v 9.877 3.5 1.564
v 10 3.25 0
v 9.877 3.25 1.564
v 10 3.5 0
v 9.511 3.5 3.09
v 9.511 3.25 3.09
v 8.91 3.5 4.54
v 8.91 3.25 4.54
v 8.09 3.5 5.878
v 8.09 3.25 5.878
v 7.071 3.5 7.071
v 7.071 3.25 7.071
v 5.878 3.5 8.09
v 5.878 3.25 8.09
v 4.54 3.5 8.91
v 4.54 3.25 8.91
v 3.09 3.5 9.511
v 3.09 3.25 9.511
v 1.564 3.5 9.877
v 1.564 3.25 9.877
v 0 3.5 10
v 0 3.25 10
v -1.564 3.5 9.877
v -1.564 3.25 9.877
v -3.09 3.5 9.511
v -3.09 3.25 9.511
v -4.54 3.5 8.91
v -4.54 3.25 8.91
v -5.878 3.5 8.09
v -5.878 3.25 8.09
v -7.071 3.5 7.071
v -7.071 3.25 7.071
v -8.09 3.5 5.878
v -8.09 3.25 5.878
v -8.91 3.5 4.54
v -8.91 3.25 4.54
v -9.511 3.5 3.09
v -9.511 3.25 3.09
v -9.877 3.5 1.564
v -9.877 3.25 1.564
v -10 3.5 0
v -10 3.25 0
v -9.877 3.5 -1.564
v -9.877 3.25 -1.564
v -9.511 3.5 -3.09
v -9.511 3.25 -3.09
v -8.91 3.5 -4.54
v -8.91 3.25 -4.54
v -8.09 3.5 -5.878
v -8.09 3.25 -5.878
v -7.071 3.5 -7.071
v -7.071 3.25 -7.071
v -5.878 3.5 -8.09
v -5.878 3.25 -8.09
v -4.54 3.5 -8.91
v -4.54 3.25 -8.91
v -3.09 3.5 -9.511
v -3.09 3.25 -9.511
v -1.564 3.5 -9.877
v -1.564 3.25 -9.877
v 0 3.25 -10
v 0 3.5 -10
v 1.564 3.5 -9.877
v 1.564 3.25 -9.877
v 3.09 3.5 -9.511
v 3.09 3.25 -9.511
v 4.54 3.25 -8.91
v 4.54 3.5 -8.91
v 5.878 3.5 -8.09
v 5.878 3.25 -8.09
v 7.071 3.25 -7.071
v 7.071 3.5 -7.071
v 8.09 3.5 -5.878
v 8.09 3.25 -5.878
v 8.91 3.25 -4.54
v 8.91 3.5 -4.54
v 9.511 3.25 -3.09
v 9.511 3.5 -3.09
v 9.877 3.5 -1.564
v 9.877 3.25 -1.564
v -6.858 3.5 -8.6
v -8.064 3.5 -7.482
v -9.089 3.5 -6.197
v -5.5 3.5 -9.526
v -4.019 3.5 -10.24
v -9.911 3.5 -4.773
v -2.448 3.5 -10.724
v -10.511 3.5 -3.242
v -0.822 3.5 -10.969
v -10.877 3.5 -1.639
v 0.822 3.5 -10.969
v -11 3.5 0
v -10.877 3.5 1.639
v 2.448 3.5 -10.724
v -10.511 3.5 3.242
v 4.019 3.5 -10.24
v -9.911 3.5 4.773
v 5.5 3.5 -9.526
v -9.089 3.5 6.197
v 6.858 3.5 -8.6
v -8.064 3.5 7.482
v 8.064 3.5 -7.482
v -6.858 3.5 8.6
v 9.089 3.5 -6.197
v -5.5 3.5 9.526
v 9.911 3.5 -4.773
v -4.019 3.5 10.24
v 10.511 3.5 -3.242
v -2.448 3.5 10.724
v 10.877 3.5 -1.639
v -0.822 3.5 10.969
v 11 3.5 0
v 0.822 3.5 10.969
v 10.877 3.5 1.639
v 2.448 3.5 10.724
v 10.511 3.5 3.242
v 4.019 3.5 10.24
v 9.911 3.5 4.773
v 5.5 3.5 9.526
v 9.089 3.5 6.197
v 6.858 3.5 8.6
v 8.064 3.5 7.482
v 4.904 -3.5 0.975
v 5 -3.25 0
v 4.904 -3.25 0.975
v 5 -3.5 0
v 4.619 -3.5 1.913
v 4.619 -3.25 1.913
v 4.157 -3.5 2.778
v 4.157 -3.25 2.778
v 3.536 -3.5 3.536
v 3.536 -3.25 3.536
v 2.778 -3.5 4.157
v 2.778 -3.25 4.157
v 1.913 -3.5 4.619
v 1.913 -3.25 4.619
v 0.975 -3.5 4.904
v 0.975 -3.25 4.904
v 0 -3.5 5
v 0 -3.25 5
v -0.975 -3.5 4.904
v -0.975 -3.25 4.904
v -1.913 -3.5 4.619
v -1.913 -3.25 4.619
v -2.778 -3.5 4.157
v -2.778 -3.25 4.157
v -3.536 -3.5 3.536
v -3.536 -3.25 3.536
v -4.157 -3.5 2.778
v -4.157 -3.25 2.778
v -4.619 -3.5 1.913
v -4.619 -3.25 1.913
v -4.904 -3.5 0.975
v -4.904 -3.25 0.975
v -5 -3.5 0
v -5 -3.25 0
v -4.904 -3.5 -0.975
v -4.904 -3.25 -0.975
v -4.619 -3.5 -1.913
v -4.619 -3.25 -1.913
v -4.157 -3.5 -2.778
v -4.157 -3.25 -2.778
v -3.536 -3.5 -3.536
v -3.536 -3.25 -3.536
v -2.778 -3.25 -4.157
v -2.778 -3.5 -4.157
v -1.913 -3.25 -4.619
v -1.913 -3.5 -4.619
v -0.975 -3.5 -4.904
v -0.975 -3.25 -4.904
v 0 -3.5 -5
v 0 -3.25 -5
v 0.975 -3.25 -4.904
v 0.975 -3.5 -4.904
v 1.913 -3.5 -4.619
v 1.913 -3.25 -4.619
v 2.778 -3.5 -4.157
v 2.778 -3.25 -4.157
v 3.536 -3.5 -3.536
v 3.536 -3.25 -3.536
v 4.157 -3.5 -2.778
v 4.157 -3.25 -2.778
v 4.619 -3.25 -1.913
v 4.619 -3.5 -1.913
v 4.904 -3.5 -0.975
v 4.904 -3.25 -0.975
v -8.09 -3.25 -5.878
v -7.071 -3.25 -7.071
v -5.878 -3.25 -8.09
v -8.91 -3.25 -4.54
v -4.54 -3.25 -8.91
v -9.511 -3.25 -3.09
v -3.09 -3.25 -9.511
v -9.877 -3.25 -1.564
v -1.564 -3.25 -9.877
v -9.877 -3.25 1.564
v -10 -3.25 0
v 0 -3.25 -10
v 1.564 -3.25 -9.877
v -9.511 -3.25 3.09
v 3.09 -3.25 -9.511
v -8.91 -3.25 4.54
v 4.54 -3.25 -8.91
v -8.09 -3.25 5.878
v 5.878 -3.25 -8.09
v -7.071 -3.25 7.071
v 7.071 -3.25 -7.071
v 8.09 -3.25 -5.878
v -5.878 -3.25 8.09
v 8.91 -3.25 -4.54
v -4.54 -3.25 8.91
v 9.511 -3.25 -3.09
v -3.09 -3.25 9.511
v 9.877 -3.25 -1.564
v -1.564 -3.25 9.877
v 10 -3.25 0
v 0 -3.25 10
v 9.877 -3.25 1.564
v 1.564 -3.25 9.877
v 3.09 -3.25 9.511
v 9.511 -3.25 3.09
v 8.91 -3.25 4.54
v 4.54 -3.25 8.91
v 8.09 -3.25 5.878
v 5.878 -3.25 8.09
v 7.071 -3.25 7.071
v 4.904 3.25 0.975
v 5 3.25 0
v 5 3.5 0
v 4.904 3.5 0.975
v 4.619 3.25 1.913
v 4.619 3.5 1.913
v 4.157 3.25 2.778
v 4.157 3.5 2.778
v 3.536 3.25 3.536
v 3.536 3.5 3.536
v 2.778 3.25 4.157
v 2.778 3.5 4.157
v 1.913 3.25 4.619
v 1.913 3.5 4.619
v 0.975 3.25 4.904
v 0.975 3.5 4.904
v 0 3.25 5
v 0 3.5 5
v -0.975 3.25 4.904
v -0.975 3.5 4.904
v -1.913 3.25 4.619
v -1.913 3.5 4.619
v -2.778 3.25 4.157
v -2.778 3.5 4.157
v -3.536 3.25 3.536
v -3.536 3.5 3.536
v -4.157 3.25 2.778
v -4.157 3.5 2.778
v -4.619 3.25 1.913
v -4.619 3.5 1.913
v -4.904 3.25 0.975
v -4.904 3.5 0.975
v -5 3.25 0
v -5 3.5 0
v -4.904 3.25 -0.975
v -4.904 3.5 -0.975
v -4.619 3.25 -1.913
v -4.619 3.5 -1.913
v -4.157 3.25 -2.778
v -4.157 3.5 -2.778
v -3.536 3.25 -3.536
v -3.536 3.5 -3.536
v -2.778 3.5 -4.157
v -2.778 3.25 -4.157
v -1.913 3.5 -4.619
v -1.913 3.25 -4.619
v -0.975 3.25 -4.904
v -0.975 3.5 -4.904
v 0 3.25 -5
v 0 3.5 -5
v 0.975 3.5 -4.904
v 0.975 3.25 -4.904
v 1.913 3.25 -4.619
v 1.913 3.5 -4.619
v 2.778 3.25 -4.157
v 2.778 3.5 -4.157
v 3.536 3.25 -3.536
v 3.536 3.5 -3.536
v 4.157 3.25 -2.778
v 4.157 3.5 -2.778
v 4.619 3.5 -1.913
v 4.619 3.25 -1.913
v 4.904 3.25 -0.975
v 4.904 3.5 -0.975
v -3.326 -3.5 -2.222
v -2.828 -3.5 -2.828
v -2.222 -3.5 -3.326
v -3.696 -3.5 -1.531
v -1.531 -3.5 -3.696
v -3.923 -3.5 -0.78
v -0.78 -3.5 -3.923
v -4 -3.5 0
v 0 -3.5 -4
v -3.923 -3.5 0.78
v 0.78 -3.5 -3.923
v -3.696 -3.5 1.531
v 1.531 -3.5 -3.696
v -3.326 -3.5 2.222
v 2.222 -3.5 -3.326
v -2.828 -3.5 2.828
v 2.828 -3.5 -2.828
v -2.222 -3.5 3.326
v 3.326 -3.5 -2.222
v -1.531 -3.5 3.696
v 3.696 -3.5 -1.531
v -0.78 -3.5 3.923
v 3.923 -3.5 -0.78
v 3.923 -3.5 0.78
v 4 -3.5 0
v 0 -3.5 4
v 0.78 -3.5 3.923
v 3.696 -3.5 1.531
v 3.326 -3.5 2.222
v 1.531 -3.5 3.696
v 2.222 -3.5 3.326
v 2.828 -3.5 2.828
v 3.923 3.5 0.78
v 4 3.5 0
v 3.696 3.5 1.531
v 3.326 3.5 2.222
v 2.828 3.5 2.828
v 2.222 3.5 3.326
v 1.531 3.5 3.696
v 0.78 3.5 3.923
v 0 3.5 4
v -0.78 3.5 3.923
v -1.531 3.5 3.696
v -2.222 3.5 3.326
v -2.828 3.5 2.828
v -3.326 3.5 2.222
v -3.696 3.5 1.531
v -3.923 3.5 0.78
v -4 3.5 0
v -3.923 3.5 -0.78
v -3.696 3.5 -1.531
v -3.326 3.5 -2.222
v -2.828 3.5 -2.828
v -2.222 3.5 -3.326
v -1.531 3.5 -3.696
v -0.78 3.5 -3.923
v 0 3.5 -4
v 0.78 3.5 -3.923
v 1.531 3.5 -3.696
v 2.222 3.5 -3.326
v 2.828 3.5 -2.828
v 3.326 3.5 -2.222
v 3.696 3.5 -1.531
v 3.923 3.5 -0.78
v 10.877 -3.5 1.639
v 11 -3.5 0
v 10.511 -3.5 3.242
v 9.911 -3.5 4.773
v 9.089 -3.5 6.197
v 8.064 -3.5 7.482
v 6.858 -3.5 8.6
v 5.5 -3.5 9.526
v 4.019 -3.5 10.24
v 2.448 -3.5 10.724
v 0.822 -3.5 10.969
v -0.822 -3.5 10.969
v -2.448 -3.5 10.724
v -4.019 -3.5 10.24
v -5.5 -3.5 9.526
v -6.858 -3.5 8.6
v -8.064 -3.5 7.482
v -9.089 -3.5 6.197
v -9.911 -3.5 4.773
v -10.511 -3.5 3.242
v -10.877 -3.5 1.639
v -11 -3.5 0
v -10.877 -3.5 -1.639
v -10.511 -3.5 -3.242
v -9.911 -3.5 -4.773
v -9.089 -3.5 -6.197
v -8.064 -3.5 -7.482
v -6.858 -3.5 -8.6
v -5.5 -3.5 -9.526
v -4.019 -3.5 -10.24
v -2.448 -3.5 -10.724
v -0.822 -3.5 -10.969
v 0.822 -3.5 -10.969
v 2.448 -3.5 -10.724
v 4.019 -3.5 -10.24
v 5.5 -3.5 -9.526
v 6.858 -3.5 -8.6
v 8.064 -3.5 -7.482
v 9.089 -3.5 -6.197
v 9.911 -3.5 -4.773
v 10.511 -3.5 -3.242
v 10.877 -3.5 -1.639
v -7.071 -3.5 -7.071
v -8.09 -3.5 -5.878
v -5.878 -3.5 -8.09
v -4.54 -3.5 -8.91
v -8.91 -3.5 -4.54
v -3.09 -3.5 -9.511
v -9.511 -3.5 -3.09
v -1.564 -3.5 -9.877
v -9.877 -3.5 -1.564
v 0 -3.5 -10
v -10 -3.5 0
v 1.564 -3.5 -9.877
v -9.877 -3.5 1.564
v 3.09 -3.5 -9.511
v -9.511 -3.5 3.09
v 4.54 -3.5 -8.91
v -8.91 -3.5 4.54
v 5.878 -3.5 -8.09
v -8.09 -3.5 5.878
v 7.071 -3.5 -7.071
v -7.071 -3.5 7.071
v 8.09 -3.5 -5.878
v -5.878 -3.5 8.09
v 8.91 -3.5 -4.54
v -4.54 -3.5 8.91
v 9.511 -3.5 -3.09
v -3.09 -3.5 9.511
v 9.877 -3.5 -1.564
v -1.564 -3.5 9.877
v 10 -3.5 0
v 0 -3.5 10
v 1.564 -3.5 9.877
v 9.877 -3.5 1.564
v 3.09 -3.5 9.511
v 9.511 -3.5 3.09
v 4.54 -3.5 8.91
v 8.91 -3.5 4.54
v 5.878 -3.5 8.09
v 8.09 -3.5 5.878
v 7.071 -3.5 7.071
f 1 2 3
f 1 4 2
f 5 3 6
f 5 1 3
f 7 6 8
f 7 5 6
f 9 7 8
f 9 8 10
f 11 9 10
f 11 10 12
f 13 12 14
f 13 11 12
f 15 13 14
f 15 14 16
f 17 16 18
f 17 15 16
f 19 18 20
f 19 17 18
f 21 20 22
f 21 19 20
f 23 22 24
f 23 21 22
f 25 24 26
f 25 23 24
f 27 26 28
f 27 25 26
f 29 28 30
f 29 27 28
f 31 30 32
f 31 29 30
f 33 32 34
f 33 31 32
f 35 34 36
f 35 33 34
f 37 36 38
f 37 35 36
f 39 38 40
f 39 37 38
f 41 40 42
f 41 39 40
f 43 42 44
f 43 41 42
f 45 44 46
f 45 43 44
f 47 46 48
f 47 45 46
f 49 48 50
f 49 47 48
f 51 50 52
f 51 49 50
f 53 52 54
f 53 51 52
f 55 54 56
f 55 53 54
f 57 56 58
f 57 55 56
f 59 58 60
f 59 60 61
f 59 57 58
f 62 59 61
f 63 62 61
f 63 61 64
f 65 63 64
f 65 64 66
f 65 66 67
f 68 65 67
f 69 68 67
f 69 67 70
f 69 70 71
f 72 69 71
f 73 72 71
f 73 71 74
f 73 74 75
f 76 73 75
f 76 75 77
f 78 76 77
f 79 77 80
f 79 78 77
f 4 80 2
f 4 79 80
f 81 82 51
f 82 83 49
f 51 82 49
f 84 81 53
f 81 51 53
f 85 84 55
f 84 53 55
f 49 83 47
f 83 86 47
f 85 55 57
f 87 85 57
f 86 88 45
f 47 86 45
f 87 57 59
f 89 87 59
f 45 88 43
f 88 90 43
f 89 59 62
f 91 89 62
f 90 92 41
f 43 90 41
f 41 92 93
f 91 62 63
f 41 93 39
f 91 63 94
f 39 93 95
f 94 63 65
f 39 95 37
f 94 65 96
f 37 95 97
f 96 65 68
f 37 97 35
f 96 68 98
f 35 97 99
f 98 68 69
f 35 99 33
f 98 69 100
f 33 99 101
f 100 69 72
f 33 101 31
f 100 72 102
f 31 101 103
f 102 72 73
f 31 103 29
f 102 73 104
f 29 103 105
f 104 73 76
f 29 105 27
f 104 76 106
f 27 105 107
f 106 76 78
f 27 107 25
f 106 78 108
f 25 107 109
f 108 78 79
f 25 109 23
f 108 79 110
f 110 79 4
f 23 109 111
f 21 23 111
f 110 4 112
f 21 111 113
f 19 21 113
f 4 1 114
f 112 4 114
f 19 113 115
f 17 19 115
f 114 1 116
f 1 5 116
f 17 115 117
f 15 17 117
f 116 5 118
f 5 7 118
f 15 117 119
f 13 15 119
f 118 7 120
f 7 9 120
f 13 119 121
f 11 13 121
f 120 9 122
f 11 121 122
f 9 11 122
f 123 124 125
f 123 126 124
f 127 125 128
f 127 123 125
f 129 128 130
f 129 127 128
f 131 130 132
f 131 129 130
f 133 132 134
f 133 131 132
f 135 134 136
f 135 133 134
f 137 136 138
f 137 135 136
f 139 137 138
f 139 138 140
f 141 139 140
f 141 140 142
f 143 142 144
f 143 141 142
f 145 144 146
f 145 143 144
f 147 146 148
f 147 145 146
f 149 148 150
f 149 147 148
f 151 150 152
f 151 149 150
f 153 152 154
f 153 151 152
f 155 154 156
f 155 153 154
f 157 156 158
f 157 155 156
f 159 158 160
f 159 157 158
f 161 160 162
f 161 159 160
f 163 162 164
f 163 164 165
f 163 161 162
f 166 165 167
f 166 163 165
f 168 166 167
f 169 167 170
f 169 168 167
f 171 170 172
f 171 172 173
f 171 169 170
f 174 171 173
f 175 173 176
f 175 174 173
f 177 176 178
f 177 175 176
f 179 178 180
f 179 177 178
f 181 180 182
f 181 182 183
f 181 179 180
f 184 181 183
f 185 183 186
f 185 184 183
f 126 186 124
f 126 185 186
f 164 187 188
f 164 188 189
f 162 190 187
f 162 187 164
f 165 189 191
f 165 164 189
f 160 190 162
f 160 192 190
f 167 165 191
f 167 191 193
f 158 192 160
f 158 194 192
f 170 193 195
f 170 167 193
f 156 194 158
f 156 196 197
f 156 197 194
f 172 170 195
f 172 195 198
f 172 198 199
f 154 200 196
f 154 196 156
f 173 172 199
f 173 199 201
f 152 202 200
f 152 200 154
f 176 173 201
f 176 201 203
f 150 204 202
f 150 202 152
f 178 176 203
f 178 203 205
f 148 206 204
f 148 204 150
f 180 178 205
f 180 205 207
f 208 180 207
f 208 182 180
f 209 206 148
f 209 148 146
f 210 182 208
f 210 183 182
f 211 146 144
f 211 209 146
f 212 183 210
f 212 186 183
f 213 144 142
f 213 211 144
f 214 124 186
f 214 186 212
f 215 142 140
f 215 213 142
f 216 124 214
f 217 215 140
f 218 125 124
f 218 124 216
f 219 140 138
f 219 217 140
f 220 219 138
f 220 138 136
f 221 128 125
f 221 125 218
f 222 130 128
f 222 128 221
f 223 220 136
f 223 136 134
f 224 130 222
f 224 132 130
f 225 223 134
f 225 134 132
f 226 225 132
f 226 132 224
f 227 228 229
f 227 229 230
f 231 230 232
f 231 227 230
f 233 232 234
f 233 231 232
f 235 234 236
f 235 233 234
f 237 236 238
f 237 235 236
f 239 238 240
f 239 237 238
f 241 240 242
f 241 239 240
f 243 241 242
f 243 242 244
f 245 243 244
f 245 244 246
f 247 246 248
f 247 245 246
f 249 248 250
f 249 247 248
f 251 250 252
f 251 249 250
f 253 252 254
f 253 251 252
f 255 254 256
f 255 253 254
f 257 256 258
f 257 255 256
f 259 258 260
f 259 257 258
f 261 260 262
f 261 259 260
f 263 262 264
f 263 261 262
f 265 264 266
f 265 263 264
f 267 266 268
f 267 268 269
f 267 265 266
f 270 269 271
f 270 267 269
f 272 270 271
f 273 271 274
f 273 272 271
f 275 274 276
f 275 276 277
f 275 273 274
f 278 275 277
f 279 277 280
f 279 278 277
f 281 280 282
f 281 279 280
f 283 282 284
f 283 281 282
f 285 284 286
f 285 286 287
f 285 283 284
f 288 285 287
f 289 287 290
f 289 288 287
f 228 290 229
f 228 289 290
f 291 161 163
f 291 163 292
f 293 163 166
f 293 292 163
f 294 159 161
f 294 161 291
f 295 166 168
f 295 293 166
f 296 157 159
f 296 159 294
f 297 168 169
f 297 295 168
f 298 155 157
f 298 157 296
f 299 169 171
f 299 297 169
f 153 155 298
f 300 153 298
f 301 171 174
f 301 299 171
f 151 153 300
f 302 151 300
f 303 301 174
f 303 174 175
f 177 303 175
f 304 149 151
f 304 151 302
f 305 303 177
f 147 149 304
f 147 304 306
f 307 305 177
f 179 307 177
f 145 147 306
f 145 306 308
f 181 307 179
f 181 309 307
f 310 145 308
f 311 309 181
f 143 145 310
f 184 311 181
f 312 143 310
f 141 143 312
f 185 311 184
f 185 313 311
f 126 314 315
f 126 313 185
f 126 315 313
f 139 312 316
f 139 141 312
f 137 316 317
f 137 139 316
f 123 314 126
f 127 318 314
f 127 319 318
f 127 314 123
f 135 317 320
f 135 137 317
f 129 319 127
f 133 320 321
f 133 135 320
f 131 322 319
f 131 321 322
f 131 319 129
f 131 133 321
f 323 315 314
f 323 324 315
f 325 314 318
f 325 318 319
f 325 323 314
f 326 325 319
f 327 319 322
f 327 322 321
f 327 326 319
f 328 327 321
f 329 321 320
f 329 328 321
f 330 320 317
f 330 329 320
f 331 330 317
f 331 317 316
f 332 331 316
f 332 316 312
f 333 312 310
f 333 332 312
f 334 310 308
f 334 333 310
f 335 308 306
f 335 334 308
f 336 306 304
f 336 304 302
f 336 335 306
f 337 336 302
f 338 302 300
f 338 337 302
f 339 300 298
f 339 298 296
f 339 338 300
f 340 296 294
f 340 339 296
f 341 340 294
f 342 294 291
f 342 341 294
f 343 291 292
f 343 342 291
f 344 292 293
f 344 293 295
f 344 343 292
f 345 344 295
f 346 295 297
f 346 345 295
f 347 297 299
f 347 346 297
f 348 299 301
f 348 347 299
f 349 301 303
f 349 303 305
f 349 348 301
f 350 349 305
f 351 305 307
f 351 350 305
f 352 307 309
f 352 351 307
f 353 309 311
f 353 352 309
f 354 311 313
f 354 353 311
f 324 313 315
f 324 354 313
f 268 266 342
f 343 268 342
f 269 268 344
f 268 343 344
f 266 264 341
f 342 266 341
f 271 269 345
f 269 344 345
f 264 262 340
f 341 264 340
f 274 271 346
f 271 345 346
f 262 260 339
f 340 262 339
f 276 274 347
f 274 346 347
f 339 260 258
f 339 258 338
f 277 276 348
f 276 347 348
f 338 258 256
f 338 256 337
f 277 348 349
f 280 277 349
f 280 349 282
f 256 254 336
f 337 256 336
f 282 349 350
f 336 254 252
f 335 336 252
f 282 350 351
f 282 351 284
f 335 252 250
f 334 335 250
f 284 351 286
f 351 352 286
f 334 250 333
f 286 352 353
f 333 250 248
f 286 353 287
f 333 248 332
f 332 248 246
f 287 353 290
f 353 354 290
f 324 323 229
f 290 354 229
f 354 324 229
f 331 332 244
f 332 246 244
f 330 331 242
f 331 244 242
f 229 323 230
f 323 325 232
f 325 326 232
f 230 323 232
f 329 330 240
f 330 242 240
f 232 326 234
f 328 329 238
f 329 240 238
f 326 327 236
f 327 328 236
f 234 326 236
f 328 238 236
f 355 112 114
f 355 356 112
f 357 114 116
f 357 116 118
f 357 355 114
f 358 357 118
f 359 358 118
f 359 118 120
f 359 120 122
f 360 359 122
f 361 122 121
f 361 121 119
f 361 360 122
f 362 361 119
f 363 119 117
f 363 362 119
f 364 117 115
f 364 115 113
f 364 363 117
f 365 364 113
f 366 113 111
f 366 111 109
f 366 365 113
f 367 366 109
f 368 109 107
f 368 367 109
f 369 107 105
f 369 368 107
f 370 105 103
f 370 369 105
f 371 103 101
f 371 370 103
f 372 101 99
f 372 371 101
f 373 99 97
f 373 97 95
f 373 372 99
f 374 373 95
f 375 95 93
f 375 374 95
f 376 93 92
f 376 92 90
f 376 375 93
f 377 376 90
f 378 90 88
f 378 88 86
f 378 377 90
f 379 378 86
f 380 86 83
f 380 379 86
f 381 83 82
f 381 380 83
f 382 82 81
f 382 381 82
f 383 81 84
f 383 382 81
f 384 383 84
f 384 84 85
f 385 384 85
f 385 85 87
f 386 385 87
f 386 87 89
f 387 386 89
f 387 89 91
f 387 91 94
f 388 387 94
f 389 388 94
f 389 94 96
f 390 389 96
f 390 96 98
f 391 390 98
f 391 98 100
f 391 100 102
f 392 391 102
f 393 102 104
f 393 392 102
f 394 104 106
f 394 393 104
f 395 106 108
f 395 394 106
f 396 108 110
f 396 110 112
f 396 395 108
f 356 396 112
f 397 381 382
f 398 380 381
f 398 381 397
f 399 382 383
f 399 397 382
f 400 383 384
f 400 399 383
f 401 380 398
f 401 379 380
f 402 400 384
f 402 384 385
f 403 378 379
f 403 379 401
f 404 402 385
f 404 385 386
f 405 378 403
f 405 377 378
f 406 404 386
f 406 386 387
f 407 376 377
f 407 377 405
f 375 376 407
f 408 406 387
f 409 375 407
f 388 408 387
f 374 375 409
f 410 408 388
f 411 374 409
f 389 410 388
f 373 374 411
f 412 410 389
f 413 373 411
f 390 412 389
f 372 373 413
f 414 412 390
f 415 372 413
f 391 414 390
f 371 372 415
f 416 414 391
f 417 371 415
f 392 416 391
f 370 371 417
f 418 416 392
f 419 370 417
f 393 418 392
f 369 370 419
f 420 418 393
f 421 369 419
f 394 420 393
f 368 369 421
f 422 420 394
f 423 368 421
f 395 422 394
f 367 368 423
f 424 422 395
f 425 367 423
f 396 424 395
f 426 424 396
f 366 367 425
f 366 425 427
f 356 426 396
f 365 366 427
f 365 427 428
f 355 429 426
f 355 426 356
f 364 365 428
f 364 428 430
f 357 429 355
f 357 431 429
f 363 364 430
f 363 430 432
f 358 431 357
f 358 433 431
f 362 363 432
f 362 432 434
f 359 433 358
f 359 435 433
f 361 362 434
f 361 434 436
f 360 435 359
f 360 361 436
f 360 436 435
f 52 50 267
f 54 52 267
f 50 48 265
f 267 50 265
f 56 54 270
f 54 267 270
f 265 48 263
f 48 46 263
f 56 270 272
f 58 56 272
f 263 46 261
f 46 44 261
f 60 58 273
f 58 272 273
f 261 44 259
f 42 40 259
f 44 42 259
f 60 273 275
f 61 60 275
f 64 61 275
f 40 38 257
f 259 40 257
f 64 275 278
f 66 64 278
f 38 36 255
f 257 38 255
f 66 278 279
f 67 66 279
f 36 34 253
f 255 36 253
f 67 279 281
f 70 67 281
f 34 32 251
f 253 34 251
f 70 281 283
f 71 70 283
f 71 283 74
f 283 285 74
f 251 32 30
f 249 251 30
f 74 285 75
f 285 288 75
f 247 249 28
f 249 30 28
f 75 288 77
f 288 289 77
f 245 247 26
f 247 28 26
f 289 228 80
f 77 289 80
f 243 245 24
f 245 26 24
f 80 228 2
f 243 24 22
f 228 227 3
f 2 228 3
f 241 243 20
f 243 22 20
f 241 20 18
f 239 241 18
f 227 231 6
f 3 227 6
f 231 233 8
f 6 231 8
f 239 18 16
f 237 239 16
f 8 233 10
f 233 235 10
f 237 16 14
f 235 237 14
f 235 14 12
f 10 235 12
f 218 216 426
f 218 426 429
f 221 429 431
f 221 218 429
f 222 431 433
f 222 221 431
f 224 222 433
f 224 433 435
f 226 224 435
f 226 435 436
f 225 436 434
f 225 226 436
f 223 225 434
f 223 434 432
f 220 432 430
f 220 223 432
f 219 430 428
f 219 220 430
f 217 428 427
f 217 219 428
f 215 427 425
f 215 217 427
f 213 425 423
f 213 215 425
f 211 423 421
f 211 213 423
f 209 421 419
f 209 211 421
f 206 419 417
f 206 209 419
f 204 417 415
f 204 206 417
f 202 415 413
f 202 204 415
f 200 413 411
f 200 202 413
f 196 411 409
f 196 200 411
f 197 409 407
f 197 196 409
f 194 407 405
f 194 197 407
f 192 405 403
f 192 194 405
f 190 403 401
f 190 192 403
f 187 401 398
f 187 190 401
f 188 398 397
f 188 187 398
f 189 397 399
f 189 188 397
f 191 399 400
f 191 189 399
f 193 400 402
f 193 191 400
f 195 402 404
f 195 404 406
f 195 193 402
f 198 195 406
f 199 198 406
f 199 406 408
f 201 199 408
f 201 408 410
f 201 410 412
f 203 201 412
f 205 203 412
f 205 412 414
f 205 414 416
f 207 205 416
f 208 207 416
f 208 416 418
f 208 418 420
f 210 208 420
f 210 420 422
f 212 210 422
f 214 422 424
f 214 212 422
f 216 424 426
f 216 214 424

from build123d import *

# Parameters (mm, degrees)
F0_R     = 5
F0_R_2   = 4
F1_DEPTH = 3.5
F0_R_3   = 11
F0_R_4   = 10
F2_DEPTH = 3.25


with BuildPart() as f1:
    # F0 (on Front) → F1 (new body, symmetric)
    with BuildSketch(Plane.XZ):
        Circle(F0_R)
        Circle(F0_R_2, mode=Mode.SUBTRACT)
    extrude(amount=F1_DEPTH, both=True)



with BuildPart() as f1b:
    # F0 (on Front) → F1, piece 2 (new body, symmetric)
    with BuildSketch(Plane.XZ):
        Circle(F0_R_3)
        Circle(F0_R_4, mode=Mode.SUBTRACT)
    extrude(amount=F1_DEPTH, both=True)


with BuildPart() as f1_1:
    add(f1.part)

    add(f1b.part)  # F2 merges F1b
    # F0 (on Front) → F2 (join, symmetric)
    with BuildSketch(Plane.XZ):
        Circle(F0_R_4)
        Circle(F0_R, mode=Mode.SUBTRACT)
    extrude(amount=F2_DEPTH, both=True)


solid = f1_1.part
